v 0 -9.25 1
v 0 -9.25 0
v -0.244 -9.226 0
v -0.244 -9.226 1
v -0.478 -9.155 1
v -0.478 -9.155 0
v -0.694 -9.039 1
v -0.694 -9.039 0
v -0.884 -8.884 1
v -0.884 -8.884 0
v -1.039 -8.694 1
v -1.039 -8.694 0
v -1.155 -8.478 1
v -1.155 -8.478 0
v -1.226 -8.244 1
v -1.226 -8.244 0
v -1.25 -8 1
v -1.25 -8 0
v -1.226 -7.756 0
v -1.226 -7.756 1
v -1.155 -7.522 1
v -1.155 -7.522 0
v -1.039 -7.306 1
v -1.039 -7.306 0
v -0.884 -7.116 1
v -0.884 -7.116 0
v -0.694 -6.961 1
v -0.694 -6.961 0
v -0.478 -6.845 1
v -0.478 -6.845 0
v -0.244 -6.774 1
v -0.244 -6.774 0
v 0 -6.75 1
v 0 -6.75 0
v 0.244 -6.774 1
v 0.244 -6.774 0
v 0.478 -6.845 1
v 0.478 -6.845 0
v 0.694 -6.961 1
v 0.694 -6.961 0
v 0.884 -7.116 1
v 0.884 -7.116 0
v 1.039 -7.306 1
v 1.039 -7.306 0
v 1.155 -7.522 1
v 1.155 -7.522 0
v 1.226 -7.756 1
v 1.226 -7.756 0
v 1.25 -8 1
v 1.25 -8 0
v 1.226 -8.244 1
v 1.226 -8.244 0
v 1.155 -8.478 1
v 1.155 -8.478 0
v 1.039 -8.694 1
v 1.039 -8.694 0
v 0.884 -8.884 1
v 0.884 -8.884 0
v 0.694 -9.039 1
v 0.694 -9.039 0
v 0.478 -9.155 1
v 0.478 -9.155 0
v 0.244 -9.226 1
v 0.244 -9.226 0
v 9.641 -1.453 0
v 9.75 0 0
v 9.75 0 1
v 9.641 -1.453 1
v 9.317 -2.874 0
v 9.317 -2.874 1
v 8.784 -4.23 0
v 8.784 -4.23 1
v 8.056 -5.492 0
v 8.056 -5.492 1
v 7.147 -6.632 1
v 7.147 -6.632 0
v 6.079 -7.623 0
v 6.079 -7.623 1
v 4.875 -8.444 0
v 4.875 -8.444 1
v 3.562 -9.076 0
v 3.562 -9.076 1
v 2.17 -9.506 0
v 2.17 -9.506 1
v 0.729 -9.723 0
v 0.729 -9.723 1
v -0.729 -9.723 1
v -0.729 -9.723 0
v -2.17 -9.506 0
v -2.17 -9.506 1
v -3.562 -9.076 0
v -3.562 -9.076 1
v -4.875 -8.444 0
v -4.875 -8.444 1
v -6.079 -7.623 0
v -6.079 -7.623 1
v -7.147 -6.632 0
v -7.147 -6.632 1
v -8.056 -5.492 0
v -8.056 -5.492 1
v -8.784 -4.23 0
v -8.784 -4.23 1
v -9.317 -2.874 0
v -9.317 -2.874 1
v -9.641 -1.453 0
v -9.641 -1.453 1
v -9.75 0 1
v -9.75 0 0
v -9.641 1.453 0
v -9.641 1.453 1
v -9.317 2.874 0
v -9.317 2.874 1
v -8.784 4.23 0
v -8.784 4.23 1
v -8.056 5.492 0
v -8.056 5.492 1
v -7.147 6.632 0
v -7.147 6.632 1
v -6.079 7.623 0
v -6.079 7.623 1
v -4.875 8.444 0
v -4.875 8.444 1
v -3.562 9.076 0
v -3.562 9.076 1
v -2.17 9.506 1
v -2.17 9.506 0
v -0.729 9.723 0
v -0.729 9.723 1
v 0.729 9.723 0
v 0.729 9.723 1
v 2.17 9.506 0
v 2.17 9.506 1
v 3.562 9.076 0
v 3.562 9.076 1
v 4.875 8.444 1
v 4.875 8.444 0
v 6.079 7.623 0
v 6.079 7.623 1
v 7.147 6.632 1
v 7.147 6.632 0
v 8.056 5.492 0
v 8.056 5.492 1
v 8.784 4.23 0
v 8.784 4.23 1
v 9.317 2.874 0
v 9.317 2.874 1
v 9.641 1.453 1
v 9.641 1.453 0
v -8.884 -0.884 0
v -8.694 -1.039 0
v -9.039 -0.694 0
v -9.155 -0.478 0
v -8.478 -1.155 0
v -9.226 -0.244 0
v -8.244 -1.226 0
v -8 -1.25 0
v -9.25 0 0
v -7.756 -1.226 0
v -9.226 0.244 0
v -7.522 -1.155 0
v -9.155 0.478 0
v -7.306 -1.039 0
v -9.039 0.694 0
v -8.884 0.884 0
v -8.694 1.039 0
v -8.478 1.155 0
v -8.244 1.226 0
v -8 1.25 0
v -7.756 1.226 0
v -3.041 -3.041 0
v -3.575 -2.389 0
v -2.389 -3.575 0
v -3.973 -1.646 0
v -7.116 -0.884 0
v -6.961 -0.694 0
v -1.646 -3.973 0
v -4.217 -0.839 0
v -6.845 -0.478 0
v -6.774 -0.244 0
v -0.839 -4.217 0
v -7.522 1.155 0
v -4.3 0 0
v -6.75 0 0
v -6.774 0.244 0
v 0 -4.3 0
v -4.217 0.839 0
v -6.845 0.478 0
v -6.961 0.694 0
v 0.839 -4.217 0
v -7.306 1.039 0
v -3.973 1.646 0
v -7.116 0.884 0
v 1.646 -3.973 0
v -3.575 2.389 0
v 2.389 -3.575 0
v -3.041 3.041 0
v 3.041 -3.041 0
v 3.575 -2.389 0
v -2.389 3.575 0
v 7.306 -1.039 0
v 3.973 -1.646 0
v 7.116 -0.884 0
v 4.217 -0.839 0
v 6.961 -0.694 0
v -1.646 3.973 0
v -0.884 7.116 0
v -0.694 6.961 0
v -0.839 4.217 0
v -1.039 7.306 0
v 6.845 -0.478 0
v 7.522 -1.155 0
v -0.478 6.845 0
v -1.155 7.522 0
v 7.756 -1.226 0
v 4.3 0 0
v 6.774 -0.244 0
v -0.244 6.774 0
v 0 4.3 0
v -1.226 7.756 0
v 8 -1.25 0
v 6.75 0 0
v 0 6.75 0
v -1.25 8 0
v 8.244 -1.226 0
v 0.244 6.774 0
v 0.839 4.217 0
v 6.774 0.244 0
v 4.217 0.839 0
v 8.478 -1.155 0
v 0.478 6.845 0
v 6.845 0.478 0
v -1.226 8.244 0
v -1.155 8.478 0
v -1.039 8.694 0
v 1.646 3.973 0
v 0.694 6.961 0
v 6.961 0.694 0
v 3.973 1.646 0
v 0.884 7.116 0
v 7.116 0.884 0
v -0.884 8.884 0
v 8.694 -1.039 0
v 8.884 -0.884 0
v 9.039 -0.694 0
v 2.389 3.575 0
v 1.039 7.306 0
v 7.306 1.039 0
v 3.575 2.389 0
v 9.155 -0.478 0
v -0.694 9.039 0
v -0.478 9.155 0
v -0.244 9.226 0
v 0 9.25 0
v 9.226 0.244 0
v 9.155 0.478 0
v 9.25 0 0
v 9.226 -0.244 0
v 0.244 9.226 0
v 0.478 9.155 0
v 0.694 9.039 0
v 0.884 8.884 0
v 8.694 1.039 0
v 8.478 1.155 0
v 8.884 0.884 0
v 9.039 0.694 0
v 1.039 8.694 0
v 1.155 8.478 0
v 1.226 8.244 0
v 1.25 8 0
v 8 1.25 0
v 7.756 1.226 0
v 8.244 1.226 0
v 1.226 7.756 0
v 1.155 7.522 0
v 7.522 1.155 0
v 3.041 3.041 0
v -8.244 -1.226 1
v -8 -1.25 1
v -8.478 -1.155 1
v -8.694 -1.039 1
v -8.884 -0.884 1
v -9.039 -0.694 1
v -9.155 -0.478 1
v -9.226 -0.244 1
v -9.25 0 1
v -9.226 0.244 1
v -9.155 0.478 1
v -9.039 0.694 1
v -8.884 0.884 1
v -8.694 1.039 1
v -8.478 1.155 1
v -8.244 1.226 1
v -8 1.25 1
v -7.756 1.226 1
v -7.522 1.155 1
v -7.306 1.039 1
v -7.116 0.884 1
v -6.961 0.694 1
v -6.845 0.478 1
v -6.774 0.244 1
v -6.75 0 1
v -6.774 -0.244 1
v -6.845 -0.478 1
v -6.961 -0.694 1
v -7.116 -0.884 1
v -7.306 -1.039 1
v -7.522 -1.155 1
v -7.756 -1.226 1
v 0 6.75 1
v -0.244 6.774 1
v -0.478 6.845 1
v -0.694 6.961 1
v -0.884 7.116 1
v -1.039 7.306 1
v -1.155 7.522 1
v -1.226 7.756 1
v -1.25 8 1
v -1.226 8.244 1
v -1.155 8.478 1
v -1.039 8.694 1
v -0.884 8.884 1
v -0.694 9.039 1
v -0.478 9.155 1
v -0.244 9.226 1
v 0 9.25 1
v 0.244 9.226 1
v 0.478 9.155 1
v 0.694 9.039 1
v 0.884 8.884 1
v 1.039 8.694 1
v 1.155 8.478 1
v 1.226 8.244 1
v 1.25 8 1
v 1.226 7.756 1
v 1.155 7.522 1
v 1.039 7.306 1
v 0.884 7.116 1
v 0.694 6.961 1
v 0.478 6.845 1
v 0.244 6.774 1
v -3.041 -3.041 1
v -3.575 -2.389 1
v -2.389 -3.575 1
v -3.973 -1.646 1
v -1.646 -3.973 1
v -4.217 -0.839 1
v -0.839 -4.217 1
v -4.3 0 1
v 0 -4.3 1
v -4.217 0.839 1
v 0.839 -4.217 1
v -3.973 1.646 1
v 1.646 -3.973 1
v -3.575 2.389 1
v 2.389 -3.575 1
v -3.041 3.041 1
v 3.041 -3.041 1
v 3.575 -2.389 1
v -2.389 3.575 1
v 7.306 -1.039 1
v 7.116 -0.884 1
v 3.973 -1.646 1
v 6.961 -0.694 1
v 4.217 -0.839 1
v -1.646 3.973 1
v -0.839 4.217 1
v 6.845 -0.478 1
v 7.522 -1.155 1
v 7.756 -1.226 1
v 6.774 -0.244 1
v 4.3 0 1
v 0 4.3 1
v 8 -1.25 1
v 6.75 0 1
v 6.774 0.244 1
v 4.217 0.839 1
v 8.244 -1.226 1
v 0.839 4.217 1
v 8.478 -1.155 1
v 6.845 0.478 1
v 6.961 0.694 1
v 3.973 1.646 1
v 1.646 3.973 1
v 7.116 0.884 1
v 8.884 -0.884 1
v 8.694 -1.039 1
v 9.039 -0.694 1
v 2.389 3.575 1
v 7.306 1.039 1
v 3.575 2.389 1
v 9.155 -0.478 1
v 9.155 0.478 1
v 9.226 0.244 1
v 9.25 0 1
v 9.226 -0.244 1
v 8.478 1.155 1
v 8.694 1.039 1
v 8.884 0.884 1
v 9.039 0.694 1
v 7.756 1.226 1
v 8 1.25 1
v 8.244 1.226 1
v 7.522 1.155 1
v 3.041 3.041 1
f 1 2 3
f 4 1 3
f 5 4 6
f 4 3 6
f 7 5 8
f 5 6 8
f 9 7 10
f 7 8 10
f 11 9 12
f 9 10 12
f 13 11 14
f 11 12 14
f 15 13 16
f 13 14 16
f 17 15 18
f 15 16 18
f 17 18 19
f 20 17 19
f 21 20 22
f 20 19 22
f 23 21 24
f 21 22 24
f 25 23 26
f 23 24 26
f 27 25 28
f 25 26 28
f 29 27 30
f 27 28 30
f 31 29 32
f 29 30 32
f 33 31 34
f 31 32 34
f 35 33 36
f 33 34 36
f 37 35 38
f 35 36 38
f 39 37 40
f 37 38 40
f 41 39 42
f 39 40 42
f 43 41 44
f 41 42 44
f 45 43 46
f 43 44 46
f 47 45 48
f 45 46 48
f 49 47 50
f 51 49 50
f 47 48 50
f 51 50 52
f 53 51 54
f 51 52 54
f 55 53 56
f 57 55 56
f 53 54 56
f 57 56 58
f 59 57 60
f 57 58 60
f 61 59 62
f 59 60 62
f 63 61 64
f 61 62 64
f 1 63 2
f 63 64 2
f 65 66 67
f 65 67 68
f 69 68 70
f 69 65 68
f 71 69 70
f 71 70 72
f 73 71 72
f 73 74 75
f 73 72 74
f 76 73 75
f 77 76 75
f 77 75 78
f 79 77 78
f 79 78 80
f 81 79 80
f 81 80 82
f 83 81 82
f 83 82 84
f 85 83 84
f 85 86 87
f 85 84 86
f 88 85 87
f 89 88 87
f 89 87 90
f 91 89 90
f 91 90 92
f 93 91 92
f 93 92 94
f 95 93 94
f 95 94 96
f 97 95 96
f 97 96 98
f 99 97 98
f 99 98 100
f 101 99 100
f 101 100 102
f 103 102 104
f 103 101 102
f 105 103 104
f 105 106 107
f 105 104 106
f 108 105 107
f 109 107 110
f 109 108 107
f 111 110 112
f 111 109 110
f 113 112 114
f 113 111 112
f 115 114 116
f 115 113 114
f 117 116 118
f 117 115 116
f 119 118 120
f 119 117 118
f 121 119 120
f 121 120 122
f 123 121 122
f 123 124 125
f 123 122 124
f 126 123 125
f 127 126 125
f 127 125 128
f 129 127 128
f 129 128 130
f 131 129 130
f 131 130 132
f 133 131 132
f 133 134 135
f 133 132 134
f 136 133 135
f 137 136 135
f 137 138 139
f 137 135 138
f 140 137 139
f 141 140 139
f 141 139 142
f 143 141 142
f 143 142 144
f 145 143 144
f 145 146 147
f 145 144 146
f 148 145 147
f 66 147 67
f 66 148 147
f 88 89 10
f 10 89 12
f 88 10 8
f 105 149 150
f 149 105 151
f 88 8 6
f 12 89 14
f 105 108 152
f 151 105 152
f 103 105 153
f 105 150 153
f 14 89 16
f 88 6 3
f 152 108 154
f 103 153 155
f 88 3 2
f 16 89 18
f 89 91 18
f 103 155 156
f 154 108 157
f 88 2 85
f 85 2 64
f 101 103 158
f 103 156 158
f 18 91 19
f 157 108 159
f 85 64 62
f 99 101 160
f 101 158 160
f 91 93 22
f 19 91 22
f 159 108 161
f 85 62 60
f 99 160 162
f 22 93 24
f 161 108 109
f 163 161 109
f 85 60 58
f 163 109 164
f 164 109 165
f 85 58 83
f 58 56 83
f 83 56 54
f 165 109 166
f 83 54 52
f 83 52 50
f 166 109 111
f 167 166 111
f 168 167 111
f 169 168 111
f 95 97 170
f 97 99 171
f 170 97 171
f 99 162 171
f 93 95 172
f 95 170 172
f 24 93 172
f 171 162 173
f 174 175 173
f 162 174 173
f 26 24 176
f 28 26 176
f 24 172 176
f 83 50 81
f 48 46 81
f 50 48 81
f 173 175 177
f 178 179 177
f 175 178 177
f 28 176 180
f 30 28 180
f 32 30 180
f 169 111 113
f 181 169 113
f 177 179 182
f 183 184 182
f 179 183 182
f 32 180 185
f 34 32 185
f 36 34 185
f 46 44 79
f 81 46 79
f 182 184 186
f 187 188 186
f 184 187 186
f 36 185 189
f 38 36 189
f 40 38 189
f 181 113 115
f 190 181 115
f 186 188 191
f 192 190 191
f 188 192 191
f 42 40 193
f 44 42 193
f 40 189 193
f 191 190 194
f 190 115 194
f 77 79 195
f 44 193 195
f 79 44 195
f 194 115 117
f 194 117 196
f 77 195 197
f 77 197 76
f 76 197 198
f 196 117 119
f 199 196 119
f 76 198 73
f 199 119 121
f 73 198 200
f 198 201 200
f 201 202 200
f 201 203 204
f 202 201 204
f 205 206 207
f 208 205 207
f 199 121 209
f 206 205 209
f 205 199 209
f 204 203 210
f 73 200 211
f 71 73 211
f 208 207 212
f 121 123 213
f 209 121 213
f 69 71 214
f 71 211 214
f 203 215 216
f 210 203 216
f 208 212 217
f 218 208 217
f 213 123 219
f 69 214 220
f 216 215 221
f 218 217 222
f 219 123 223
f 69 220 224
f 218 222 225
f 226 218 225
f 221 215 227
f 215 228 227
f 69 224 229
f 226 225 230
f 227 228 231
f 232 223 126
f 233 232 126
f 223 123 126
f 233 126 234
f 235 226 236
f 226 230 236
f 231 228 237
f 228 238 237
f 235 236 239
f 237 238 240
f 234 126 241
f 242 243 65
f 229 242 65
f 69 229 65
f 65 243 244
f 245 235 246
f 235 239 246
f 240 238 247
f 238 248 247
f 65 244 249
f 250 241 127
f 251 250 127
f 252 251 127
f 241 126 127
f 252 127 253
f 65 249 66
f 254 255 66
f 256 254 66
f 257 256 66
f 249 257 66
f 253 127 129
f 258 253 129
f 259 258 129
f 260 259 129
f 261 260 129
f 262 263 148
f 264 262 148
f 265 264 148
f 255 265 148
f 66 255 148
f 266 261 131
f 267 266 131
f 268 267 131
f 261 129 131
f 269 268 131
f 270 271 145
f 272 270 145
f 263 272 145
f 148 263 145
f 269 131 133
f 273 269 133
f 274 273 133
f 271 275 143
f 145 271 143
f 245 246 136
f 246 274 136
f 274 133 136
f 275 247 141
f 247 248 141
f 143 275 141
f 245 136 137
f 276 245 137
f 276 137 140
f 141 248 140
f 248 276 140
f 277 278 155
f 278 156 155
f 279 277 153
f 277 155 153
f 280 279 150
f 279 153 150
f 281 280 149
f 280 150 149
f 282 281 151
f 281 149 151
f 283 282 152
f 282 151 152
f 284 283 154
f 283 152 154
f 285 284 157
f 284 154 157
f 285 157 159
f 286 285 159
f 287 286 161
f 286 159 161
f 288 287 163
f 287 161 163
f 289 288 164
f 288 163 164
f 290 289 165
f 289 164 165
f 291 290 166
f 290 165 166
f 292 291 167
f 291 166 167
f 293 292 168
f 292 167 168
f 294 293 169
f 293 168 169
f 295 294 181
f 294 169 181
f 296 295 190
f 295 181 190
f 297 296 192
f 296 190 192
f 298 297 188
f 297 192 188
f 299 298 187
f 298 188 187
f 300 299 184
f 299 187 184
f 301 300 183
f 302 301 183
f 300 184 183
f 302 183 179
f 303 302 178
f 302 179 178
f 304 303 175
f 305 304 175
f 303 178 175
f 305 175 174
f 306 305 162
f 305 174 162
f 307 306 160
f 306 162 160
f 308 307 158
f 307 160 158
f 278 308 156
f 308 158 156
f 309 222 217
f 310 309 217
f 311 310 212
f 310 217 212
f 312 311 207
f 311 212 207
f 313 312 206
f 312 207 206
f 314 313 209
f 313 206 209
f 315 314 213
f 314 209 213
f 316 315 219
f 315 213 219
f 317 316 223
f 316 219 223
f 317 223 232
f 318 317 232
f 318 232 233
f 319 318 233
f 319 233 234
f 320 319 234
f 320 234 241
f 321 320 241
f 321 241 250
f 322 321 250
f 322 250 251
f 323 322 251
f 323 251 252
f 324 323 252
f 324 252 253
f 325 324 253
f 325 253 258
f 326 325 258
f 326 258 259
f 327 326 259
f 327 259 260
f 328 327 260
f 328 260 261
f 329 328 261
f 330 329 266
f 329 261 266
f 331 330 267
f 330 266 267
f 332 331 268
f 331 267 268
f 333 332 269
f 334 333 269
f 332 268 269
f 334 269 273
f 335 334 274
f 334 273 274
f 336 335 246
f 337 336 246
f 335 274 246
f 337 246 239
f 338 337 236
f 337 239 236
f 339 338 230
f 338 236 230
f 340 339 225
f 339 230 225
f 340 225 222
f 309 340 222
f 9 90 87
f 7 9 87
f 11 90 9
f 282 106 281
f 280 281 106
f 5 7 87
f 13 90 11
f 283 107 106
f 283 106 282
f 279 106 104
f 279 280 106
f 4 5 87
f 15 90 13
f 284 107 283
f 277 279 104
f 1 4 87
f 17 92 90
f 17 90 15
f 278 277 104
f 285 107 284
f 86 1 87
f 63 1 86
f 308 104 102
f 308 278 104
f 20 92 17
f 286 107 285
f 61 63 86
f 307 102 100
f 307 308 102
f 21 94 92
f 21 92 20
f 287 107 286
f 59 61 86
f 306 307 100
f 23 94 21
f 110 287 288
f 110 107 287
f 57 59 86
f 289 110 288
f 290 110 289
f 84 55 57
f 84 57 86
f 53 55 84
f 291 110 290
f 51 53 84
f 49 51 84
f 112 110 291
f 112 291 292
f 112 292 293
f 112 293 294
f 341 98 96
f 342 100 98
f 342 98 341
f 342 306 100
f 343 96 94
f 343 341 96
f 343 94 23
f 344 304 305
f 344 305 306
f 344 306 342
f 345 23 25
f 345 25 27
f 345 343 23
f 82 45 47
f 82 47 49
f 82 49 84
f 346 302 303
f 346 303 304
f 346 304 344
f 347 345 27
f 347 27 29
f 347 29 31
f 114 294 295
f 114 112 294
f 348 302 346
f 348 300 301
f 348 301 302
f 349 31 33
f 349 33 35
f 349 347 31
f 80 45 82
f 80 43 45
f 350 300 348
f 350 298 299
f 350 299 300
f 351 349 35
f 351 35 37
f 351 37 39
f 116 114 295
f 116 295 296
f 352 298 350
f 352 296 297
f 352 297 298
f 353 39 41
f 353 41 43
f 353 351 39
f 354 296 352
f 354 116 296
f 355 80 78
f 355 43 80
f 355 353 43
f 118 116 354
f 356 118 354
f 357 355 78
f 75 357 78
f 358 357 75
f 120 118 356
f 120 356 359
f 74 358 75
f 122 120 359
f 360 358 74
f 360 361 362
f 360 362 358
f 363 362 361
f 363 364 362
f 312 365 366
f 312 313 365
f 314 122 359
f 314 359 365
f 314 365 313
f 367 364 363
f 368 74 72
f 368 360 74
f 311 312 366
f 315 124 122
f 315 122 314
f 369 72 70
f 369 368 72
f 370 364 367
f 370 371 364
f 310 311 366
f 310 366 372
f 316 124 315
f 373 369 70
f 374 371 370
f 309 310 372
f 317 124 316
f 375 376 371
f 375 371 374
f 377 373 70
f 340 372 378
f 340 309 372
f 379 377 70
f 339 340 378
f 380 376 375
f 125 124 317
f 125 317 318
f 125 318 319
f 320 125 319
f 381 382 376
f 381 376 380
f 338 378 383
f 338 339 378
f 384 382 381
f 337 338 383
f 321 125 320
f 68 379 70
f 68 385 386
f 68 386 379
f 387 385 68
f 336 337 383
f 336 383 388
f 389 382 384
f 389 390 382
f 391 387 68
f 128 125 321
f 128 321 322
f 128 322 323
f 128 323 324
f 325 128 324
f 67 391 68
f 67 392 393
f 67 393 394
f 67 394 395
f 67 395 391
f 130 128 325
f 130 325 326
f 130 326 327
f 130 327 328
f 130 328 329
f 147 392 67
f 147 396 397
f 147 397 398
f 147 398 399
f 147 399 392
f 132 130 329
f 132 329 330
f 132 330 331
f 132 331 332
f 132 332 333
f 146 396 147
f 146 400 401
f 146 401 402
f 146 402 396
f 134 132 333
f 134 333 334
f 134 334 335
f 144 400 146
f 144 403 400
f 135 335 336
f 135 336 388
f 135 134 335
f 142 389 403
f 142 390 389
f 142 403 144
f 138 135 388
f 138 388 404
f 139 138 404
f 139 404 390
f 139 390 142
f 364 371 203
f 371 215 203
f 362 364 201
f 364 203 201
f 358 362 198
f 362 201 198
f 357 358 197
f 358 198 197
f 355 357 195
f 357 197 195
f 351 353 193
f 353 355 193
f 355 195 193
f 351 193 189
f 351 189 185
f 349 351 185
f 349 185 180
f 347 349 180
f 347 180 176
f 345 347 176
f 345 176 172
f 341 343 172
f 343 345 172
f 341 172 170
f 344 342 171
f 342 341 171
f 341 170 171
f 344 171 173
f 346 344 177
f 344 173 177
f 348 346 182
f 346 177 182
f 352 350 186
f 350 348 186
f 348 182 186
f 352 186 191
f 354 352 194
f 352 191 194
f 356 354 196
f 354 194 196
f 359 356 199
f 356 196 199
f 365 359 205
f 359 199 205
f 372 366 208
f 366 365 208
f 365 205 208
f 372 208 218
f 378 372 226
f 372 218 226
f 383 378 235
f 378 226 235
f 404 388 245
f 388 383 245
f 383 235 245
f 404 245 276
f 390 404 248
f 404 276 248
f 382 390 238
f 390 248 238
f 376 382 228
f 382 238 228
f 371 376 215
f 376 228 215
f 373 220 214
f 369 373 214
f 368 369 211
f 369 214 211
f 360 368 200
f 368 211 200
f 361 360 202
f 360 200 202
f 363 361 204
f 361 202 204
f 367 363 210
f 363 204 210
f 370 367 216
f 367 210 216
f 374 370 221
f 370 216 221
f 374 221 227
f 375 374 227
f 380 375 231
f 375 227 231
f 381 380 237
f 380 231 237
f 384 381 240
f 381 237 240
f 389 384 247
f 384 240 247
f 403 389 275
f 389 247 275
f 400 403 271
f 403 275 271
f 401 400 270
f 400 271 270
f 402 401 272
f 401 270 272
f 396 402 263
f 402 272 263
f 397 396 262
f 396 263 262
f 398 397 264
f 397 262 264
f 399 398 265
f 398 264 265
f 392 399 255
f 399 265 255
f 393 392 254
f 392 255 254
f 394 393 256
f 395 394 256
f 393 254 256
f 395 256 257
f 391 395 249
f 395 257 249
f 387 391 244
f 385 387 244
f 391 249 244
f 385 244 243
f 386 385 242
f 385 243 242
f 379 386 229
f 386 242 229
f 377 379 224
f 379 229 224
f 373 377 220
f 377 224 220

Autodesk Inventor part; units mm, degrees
ref_plane "YZ Plane" through (0, 0, 0) normal (1, 0, 0) x (0, 1, 0)
ref_plane "XZ Plane" through (0, 0, 0) normal (0, 1, 0) x (-1, 0, 0)
ref_plane "XY Plane" through (0, 0, 0) normal (0, 0, 1) x (1, 0, 0)
sketch "スケッチ1" plane through (0, 0, 0) normal (0, 0, 1) x (1, 0, 0)
  circle A0 centre (0, 0) radius 9.75
  circle A1 centre (0, 0) radius 4.3
  dimension "d0" = 19.5
  dimension "d1" = 8.6
extrude "押し出し1" add sketch "スケッチ1" along normal blind 1
sketch "スケッチ2" plane through (0, 0, 1) normal (0, 0, 1) x (1, 0, 0)
  circle A0 centre (0, 0) radius 8
  point P0 (0, 8)
  point P1 (-8, 0)
  point P2 (0, -8)
  point P3 (8, 0)
  dimension "d4" = 16
  dimension "d7" = 360
hole "穴1" at (0, 8, 1) at (-8, 0, 1) at (0, -8, 1) at (8, 0, 1) direction (0, 0, -1) diameter 2.5 end through all
properties part number "rotor_shim"
